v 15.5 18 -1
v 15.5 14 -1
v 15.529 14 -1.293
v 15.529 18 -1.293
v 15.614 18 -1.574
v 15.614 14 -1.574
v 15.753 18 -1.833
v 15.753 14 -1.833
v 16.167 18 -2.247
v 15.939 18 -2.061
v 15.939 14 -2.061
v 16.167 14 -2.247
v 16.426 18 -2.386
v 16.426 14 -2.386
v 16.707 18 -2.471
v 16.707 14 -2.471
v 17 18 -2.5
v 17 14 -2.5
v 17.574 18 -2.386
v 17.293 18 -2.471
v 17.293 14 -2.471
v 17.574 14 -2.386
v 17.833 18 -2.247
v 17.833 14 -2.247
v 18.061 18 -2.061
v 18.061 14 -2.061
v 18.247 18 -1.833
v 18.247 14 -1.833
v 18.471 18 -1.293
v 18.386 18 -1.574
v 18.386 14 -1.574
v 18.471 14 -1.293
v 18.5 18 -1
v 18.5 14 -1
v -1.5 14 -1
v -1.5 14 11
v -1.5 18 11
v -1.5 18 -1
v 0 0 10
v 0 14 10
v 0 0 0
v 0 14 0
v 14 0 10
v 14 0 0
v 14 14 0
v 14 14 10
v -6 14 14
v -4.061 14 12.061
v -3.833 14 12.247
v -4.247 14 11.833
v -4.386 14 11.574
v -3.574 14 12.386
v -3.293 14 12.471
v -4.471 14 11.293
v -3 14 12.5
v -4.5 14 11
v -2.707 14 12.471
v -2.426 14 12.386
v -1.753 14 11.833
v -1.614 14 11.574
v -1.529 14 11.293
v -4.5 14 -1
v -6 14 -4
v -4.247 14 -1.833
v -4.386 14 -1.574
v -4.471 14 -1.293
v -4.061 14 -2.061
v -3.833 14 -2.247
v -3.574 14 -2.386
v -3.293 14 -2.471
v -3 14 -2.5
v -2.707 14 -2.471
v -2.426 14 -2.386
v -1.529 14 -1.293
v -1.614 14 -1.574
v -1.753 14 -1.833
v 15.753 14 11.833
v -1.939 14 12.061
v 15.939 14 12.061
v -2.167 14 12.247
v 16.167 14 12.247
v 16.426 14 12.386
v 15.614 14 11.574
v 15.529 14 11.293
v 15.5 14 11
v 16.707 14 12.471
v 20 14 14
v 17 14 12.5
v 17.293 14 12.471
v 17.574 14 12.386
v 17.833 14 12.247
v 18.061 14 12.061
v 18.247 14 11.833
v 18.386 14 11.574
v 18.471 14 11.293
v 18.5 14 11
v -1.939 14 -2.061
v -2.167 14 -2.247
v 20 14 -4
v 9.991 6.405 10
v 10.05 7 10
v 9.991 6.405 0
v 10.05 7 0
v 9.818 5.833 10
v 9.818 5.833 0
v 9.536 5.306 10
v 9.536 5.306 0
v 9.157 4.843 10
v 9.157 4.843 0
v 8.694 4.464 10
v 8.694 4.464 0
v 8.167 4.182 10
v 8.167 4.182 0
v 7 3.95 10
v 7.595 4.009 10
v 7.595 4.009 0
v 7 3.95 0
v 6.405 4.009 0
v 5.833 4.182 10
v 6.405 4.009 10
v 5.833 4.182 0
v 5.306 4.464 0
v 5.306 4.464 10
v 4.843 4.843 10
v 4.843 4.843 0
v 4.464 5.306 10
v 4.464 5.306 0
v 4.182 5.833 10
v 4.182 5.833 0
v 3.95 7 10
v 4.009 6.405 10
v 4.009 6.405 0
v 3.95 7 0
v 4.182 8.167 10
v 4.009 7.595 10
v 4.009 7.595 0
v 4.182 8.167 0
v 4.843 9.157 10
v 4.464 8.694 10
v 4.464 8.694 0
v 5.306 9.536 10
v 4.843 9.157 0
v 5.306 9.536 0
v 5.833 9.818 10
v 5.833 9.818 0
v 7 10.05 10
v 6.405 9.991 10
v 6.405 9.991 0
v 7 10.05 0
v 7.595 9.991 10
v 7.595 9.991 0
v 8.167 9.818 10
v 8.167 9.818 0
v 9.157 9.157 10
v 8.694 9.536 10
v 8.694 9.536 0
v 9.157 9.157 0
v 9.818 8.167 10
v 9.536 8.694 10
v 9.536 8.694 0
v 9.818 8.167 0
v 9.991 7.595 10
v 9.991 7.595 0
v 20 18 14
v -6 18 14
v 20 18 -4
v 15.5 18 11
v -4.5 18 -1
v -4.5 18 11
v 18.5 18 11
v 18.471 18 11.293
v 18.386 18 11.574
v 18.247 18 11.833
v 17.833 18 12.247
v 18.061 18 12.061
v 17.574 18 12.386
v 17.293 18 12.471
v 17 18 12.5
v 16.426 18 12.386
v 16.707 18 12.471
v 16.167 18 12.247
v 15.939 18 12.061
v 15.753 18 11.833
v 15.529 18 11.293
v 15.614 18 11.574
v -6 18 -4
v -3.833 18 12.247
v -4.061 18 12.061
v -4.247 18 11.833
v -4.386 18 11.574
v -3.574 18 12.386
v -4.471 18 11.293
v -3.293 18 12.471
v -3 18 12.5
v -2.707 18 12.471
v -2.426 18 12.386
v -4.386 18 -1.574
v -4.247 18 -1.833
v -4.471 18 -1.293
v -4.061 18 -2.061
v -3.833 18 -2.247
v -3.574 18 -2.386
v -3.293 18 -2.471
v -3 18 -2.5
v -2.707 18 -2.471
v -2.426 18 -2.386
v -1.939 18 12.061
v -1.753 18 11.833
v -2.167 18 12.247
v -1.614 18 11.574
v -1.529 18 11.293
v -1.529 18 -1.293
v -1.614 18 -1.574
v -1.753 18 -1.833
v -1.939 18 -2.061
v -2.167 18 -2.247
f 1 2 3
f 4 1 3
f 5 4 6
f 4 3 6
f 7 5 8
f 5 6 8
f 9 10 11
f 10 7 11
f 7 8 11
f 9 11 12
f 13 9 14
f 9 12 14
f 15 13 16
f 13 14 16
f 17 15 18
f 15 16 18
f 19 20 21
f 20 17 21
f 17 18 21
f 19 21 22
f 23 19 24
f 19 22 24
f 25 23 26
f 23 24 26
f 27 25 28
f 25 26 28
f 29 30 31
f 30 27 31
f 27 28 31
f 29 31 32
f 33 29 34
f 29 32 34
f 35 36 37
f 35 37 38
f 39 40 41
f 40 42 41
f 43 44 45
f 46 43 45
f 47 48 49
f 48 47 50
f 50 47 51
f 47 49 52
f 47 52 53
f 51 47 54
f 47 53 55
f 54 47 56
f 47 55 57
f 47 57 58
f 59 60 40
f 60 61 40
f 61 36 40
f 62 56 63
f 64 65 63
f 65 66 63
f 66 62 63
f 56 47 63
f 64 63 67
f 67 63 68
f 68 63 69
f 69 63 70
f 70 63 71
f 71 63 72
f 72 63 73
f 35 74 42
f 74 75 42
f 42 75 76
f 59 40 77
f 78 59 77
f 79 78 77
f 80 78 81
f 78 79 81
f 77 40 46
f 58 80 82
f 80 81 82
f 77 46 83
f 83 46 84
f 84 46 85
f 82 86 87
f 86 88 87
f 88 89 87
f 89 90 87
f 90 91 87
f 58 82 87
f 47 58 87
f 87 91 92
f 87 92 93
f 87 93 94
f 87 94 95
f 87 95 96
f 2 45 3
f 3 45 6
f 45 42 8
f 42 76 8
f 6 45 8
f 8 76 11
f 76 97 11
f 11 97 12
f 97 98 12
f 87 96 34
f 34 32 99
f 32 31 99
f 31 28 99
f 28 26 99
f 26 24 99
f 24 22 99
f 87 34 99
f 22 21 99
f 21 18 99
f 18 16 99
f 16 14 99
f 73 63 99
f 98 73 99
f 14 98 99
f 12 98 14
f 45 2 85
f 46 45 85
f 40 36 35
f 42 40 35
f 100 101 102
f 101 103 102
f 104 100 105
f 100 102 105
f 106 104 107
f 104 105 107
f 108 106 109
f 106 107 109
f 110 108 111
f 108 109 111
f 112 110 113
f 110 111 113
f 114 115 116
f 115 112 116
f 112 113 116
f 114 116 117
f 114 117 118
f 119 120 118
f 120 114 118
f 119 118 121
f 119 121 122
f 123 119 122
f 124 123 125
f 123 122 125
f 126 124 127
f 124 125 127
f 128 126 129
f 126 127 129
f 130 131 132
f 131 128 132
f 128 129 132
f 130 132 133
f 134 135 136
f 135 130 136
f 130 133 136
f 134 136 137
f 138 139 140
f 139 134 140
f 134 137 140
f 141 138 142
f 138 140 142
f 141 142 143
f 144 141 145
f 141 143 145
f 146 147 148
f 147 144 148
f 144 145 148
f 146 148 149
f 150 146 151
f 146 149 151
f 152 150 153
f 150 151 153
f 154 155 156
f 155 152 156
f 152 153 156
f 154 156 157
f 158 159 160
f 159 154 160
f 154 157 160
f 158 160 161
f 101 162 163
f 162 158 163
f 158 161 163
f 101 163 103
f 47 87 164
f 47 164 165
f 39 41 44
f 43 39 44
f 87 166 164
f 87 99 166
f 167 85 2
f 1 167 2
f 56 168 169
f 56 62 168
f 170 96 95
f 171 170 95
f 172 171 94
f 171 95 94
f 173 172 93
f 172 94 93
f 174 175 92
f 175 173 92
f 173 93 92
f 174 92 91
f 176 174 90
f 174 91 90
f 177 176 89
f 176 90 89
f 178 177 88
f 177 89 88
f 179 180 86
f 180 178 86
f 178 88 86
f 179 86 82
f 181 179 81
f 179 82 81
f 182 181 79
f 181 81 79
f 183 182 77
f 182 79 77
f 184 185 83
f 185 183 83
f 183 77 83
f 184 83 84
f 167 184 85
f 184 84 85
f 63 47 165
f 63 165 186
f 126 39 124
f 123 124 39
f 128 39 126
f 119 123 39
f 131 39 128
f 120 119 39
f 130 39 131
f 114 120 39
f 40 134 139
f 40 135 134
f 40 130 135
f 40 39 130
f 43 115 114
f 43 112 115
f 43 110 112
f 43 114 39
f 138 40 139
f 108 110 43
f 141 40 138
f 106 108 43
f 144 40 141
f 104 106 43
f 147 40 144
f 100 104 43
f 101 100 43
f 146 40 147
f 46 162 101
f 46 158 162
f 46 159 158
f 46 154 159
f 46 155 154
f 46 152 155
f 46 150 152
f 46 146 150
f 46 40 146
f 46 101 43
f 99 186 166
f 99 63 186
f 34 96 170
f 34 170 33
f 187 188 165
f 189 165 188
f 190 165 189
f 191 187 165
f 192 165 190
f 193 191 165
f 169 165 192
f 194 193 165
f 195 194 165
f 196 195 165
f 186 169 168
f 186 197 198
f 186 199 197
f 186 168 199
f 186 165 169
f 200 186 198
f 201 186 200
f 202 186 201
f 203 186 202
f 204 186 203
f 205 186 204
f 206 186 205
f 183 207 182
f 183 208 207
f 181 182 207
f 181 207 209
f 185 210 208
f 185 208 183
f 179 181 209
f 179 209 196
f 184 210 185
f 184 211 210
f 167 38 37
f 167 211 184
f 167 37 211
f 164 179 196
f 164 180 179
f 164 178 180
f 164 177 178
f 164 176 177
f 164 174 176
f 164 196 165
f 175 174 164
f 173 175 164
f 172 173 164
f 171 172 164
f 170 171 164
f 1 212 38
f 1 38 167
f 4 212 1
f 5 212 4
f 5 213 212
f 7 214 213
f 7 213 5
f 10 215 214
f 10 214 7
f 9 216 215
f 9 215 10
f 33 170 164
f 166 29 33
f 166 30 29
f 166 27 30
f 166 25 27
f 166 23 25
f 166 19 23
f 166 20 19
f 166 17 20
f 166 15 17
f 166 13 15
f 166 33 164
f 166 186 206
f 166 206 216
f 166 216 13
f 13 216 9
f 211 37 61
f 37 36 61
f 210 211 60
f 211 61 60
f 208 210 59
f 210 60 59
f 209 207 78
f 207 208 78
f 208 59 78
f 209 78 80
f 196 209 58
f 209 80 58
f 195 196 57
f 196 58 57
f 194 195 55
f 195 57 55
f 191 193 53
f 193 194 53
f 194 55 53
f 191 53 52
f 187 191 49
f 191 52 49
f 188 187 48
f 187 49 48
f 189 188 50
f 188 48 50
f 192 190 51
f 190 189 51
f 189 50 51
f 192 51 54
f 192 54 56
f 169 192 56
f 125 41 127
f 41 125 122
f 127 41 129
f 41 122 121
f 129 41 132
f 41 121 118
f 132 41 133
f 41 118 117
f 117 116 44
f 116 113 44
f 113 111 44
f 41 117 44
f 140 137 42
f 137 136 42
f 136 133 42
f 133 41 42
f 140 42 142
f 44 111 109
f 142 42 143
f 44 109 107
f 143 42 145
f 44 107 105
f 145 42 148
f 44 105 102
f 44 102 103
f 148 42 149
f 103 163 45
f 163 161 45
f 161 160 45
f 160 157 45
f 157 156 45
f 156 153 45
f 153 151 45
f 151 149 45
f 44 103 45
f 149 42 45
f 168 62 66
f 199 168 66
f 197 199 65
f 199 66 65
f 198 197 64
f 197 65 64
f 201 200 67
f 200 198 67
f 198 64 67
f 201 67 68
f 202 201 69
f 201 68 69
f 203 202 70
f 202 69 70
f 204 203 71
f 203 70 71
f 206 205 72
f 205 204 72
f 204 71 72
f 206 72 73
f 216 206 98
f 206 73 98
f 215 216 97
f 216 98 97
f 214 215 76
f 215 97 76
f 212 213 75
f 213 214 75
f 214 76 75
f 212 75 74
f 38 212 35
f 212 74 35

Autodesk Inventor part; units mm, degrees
ref_plane "YZ Plane" through (0, 0, 0) normal (1, 0, 0) x (0, 1, 0)
ref_plane "XZ Plane" through (0, 0, 0) normal (0, 1, 0) x (-1, 0, 0)
ref_plane "XY Plane" through (0, 0, 0) normal (0, 0, 1) x (1, 0, 0)
sketch "Skizze1" plane through (0, 0, 0) normal (0, 0, 1) x (1, 0, 0)
  line L0 (0, 0) -> (14, 0)
  line L1 (14, 0) -> (14, 14)
  line L2 (14, 14) -> (0, 14)
  line L3 (0, 14) -> (0, 0)
  circle A0 centre (7, 7) radius 3.05
  dimension "d0" = 14
  dimension "d1" = 14
  dimension "d2" = 6.1
  dimension "d3" = 7
  dimension "d4" = 7
extrude "Extrusion1" add sketch "Skizze1" along normal blind 10
sketch "Skizze2" plane through (0, 14, 0) normal (0, 1, 0) x (1, 0, 0)
  line L0 (-6, 4) -> (20, 4)
  line L1 (20, 4) -> (20, -14)
  line L2 (20, -14) -> (-6, -14)
  line L3 (-6, -14) -> (-6, 4)
  line L4 (14, 0) -> (0, 0) projected
  line L5 (0, 0) -> (0, -10) projected
  line L6 (14, -10) -> (0, -10) projected
  line L7 (14, 0) -> (14, -10) projected
  arc A0 (-1.5, 1) -> (-4.5, 1) centre (-3, 1) ccw
  arc A1 (-4.5, -11) -> (-1.5, -11) centre (-3, -11) ccw
  arc A2 (18.5, 1) -> (15.5, 1) centre (17, 1) ccw
  arc A3 (15.5, -11) -> (18.5, -11) centre (17, -11) ccw
  line L8 (-4.5, 1) -> (-4.5, -11)
  line L9 (-1.5, -11) -> (-1.5, 1)
  line L10 (15.5, -11) -> (15.5, 1)
  line L11 (18.5, -11) -> (18.5, 1)
  point P0 (0, 0)
  dimension "d7" = 6
  dimension "d8" = 6
  dimension "d9" = 4
  dimension "d10" = 4
  dimension "d11" = 3
  dimension "d12" = 3
  dimension "d13" = 3
  dimension "d14" = 3
  dimension "d15" = 3
  dimension "d16" = 3
  dimension "d17" = 3
  dimension "d18" = 3
  dimension "d19" = 3
  dimension "d20" = 3
  dimension "d21" = 3
  dimension "d22" = 3
extrude "Extrusion2" add sketch "Skizze2" along normal blind 4 contours L0 L1 L2 L3 | L7 L6 L5 L4
properties part number "Stehlager 6mm"
